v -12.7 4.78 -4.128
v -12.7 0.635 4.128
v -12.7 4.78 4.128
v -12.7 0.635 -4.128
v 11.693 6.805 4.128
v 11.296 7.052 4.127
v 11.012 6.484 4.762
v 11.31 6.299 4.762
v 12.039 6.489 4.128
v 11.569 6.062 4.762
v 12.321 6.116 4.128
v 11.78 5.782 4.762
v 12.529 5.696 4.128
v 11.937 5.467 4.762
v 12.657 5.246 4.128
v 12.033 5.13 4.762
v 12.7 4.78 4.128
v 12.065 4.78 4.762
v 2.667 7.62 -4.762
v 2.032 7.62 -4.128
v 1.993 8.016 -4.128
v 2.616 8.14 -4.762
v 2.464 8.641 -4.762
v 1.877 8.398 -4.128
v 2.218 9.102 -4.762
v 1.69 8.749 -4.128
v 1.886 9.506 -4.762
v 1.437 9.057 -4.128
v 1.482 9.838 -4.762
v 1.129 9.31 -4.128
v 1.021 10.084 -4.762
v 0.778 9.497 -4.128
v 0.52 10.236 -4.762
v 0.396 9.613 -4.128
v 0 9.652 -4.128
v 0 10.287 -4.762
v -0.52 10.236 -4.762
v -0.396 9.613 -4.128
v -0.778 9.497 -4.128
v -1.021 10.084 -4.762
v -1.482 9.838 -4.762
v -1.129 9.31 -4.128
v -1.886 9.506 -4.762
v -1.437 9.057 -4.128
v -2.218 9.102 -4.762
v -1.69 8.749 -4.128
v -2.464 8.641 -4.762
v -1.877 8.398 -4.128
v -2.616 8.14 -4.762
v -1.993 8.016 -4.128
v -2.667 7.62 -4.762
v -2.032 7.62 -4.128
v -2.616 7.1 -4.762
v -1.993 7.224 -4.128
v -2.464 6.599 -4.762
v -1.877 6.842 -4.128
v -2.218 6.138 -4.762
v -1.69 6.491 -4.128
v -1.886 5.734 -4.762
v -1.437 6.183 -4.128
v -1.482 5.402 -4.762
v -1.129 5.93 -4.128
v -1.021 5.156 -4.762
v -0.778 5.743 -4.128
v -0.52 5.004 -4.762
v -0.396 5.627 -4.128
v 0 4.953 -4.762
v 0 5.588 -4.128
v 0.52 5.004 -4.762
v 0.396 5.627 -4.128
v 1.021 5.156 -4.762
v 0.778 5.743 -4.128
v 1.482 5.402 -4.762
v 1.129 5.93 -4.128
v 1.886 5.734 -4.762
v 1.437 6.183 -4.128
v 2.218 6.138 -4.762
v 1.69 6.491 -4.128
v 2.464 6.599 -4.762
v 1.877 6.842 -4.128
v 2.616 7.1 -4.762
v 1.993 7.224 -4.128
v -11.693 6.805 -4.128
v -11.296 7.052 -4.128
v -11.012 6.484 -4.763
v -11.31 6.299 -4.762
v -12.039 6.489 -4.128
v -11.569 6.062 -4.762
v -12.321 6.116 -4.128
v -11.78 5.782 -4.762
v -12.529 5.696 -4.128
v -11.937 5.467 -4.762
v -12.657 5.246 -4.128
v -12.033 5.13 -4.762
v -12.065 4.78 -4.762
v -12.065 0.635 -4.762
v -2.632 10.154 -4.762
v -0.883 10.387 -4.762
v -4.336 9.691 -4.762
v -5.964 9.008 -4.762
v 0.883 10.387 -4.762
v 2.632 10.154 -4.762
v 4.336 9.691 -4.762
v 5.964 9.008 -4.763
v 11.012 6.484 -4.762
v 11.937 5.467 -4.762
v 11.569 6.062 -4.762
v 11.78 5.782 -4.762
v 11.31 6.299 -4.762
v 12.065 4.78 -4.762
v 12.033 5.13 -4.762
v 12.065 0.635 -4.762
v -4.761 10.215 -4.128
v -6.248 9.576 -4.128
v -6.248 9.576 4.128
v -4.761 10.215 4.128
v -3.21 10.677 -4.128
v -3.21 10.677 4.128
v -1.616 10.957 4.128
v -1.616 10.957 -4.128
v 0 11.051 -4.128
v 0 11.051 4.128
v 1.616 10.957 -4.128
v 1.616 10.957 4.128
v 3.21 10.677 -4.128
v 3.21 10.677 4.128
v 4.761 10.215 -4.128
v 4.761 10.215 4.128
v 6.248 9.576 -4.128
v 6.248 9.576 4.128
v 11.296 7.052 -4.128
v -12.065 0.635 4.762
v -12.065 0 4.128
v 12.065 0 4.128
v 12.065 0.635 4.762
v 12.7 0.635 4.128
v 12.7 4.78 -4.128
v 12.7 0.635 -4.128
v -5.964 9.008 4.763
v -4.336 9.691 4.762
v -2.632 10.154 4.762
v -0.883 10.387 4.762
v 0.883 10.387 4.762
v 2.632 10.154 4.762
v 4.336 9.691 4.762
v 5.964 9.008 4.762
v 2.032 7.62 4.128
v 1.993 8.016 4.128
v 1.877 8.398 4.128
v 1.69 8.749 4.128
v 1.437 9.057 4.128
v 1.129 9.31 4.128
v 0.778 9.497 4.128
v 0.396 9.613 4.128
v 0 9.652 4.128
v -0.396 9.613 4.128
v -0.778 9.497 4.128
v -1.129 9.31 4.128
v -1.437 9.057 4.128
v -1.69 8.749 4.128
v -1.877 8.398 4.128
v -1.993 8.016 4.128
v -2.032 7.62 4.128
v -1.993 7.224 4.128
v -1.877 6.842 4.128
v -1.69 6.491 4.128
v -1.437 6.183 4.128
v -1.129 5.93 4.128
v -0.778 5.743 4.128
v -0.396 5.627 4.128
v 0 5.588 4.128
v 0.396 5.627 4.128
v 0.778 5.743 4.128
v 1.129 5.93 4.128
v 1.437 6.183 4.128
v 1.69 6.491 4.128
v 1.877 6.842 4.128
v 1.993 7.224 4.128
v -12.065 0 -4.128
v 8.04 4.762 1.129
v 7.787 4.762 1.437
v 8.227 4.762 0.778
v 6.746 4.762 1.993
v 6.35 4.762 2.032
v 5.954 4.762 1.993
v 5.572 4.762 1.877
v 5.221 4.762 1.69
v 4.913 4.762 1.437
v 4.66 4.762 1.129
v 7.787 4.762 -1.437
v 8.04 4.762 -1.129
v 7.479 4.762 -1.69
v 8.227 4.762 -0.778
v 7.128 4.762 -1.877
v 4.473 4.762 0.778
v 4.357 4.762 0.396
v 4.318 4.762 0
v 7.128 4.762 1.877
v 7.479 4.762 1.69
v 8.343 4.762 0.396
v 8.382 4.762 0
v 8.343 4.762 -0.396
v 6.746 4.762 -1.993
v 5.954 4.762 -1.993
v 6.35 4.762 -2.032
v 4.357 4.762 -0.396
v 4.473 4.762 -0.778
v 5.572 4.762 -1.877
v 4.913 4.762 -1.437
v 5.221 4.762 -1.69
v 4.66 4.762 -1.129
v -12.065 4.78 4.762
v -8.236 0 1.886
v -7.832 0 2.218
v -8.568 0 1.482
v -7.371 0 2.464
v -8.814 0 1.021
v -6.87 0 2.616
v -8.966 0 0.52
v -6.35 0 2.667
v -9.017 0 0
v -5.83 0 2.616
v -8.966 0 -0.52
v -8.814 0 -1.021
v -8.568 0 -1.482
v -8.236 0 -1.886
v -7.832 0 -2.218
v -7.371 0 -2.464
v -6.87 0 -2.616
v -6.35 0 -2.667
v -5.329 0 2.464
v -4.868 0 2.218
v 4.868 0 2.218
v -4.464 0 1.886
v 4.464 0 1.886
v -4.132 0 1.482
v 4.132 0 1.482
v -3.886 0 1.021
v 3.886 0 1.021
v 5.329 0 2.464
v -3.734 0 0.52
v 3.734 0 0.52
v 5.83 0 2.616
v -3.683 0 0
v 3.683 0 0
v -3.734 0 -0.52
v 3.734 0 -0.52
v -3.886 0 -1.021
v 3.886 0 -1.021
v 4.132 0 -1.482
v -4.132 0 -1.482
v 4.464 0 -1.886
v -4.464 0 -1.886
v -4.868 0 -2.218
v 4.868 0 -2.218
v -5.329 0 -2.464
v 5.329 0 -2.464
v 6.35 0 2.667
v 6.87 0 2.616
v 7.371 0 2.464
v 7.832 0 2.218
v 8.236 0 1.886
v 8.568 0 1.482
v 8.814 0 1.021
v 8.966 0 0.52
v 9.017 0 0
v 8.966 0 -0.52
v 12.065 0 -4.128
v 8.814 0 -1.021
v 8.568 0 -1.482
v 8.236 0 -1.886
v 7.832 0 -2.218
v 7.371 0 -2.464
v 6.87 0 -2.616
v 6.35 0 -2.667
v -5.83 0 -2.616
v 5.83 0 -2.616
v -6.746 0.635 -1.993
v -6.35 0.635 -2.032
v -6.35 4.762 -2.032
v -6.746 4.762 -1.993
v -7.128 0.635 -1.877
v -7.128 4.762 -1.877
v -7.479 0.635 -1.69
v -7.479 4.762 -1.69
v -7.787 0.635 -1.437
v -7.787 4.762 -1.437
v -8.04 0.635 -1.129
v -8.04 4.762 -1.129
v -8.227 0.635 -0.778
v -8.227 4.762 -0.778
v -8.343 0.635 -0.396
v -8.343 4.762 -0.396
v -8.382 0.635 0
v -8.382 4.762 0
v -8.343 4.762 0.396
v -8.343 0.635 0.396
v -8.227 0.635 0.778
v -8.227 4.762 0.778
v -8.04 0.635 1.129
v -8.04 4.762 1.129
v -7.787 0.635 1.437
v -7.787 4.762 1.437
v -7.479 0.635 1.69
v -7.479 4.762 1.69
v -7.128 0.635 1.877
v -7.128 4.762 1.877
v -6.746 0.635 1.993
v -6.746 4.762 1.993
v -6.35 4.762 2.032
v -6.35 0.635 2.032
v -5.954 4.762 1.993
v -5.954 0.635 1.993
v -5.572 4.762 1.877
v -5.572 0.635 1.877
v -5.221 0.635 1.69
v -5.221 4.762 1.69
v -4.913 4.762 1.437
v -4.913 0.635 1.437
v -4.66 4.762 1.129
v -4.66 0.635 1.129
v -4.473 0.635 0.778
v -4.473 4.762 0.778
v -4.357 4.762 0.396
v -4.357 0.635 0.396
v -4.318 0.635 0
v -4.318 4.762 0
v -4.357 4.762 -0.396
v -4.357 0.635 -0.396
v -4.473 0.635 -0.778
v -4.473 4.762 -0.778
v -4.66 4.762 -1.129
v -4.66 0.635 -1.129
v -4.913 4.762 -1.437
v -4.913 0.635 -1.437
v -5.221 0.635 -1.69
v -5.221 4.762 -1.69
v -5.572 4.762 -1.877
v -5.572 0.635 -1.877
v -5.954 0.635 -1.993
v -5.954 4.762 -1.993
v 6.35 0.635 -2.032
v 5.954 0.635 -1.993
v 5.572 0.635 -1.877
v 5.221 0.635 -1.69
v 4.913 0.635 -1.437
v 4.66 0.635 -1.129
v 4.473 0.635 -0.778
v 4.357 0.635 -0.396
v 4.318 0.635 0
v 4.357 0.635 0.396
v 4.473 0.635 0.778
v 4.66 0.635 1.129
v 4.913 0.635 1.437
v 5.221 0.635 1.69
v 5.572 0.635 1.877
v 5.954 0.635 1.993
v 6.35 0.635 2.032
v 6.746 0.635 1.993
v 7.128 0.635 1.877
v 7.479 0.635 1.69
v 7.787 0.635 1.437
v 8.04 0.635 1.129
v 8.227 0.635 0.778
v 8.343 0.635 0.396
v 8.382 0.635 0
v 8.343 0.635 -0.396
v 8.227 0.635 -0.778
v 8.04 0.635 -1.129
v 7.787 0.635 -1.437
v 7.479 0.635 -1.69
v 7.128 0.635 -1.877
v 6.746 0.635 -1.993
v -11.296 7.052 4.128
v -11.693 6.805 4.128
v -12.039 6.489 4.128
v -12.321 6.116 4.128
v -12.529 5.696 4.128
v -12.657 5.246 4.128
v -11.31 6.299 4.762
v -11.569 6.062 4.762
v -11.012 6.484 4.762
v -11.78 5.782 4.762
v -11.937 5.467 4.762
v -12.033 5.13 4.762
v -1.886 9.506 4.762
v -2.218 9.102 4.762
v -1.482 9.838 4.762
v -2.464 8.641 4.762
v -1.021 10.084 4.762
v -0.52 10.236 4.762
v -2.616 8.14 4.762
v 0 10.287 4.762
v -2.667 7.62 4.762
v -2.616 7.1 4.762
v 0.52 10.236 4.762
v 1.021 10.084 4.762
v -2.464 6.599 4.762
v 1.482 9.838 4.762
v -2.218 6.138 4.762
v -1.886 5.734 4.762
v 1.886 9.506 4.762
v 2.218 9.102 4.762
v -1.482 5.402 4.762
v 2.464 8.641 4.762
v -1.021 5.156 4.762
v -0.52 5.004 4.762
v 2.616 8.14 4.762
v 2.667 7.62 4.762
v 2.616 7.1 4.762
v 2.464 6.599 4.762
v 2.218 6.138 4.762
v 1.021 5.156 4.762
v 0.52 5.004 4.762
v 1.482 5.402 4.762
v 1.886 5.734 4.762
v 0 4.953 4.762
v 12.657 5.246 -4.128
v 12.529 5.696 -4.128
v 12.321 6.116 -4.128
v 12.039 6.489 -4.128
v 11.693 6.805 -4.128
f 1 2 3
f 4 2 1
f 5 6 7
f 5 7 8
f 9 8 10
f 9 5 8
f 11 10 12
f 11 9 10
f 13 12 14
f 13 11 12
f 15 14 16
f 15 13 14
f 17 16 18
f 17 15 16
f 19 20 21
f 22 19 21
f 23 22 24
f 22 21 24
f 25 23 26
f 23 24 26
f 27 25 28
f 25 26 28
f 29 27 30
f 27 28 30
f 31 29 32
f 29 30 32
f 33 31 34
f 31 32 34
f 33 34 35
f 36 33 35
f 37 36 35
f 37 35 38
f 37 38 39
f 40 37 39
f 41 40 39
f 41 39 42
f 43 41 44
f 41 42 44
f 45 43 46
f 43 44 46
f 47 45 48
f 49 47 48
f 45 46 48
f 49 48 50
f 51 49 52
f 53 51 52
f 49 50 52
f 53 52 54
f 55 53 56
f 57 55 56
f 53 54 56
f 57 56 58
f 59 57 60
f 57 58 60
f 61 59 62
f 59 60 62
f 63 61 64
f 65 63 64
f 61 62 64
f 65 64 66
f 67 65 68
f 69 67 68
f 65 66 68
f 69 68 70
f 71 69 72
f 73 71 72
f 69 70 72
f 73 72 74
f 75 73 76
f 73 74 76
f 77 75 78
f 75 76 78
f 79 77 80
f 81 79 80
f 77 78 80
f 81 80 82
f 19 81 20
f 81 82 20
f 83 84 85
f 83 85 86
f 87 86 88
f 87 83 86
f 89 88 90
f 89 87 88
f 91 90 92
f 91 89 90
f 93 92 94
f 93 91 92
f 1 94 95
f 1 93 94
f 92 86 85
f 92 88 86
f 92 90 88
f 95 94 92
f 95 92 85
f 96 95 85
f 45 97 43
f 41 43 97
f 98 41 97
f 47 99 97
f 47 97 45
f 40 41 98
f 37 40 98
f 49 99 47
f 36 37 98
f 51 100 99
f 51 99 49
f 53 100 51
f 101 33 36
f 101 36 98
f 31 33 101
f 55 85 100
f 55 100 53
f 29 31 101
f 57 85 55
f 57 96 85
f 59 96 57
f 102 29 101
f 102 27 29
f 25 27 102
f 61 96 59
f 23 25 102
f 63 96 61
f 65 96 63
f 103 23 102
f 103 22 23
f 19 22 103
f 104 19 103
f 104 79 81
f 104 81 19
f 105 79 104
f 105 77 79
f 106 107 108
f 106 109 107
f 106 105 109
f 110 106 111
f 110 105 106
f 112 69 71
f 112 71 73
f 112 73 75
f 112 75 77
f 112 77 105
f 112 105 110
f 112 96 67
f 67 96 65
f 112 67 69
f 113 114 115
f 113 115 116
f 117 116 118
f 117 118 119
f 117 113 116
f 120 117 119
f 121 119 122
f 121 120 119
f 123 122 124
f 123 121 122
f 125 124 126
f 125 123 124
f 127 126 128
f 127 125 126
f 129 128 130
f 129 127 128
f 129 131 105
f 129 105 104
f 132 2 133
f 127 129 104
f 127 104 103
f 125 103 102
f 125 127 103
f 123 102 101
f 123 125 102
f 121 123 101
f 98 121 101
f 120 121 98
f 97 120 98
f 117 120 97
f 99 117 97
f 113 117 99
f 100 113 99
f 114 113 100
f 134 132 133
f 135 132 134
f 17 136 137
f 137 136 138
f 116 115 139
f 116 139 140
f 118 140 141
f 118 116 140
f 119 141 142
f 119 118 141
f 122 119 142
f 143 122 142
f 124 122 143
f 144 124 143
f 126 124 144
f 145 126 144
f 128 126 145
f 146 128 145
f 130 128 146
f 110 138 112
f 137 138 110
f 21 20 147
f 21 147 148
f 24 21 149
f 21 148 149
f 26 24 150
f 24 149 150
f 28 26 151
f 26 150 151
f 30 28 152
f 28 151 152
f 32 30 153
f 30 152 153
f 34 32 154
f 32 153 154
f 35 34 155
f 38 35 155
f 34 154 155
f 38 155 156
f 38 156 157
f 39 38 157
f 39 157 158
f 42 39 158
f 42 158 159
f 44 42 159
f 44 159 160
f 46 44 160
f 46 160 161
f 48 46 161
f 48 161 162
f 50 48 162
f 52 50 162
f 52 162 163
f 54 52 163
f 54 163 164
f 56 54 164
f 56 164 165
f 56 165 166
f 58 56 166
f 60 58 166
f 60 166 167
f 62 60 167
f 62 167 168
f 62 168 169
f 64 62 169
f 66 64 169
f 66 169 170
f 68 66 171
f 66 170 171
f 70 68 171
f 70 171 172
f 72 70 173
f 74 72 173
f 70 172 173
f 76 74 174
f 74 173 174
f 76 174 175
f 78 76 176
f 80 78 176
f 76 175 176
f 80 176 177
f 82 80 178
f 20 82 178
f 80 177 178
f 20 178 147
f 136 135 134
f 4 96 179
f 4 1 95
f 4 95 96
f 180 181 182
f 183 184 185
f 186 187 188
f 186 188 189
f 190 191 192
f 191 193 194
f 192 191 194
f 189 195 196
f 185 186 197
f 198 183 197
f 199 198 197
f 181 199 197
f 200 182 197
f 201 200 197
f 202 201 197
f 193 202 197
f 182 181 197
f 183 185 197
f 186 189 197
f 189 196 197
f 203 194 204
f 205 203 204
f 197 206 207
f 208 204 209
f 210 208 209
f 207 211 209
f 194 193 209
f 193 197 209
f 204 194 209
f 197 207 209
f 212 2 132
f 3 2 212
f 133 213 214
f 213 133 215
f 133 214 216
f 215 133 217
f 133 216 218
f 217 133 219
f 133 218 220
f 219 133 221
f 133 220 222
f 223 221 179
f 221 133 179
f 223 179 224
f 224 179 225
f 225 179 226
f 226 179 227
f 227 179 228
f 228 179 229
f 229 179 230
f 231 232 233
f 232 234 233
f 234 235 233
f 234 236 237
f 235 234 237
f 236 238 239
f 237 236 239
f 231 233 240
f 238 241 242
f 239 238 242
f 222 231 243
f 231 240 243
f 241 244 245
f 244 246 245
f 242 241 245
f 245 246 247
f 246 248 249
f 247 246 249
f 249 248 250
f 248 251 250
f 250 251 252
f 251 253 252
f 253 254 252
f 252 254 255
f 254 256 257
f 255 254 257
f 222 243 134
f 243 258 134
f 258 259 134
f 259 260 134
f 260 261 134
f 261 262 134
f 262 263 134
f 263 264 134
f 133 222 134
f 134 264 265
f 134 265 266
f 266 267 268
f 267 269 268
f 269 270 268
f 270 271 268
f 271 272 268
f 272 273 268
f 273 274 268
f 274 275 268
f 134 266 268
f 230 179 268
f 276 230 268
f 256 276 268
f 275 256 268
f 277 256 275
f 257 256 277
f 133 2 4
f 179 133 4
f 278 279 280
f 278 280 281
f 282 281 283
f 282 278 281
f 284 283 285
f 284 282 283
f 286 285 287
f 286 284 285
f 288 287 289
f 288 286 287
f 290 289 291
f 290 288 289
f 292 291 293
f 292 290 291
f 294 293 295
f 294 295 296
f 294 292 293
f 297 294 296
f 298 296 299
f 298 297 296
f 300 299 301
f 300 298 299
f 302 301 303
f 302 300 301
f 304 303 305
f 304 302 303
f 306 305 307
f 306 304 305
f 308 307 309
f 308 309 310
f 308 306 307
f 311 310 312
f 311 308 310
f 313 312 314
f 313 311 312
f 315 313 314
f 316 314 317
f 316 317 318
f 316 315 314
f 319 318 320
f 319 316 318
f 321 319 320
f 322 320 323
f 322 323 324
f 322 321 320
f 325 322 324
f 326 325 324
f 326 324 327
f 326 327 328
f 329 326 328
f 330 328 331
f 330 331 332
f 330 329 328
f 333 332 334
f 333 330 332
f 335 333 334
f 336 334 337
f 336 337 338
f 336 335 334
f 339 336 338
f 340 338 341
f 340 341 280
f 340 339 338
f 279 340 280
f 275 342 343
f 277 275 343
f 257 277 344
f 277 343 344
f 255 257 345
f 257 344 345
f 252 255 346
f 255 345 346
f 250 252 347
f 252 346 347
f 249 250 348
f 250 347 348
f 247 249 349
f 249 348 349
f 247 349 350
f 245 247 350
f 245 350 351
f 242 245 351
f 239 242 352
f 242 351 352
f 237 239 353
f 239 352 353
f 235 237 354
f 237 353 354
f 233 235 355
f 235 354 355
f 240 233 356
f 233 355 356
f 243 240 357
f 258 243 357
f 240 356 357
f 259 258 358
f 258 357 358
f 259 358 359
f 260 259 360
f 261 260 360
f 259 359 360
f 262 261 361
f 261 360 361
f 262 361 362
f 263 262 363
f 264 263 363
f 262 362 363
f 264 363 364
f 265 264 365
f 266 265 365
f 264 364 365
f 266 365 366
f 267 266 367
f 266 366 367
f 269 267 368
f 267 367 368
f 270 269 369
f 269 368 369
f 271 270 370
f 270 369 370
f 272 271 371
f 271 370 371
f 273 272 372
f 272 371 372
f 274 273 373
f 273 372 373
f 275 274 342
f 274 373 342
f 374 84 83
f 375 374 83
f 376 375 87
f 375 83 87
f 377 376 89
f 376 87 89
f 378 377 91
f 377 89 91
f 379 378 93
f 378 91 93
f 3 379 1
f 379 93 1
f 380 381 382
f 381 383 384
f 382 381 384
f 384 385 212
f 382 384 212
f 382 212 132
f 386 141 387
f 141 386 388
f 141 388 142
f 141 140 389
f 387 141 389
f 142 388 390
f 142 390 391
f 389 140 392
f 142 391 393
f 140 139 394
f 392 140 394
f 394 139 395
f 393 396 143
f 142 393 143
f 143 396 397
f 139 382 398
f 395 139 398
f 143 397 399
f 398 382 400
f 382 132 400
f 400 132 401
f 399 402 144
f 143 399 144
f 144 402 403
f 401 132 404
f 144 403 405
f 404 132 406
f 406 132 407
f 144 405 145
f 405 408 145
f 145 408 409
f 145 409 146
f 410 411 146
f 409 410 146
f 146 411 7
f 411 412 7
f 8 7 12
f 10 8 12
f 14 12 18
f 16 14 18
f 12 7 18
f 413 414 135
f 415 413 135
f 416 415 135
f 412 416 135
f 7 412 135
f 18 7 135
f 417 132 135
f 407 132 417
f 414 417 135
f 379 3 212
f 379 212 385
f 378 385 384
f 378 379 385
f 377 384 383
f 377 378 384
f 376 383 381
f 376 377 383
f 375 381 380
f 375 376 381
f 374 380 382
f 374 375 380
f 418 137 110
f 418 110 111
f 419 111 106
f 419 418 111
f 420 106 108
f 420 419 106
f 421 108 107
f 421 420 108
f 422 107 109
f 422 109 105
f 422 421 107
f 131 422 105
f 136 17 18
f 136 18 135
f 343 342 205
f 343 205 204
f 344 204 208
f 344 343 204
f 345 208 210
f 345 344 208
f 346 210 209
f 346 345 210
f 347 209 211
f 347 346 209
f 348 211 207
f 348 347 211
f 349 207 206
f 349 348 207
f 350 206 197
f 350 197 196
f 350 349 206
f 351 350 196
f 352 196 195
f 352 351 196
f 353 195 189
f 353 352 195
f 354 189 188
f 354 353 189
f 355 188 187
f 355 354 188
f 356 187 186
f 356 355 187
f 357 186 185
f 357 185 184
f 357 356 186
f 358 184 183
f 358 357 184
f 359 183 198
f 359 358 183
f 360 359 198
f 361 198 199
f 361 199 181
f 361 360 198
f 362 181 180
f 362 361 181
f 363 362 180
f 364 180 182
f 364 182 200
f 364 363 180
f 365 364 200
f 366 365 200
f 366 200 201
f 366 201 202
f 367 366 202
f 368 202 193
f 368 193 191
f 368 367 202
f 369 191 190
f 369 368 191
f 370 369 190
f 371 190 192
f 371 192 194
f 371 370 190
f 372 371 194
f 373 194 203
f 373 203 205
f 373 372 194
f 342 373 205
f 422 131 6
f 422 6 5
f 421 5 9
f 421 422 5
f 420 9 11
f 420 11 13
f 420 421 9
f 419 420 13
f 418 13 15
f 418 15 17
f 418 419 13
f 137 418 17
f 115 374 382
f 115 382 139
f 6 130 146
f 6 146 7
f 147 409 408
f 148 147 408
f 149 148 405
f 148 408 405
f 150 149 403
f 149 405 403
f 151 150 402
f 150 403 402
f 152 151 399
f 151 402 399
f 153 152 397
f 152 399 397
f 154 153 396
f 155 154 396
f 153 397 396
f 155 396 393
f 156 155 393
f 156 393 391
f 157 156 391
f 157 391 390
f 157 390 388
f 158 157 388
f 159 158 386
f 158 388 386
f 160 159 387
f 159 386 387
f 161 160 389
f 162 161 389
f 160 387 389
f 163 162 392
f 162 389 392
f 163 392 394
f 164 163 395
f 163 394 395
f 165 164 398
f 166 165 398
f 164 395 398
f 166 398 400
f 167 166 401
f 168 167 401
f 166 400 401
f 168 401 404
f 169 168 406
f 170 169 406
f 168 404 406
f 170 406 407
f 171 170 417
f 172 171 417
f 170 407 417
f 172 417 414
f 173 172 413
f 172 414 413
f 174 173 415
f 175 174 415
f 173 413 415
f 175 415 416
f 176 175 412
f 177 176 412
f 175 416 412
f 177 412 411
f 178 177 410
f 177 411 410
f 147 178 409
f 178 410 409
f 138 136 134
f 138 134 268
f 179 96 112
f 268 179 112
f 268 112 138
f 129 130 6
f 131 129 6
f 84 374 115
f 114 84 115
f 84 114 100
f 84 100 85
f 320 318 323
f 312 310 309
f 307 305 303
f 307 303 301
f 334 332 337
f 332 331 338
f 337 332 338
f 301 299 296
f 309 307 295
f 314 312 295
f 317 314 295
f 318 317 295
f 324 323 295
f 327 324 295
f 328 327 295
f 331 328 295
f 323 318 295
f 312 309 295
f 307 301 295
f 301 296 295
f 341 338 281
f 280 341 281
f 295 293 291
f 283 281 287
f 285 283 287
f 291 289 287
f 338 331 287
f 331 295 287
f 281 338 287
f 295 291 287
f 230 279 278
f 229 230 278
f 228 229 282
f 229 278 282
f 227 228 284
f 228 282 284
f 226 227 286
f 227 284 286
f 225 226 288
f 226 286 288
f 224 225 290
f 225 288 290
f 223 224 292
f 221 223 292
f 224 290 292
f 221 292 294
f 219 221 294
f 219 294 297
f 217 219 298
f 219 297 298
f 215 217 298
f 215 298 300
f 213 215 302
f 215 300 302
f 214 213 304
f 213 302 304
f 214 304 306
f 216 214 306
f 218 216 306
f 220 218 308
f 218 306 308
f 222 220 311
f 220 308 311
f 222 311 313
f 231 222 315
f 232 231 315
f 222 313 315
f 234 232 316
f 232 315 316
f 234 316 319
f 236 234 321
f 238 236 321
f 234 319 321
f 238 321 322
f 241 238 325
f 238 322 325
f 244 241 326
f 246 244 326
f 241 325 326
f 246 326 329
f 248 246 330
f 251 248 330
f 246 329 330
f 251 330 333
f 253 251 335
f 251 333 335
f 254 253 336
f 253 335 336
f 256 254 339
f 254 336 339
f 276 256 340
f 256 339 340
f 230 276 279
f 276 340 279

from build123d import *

# Parameters (mm, degrees)
SKETCH1_W           = 25.4
SKETCH1_H           = 9.525
BOSS_EXTRUDE1_DEPTH = 12.7
SKETCH1_3_R         = 2.032
CUT_EXTRUDE1_DEPTH  = 4.7625
SKETCH3_R           = 2.032
CUT_EXTRUDE2_DEPTH  = 21.329919454
FILLET1_R           = 13.97
FILLET2_R           = 2.54
CHAMFER1_SIZE       = 0.635
CHAMFER2_SIZE       = 0.635
CHAMFER3_SIZE       = 0.635


with BuildPart() as part:
    # Sketch1 → Boss-Extrude1 (new body)
    with BuildSketch(Plane(origin=(0, 0, 0), x_dir=(1, 0, 0), z_dir=(0, 1, 0))):
        Rectangle(SKETCH1_W, SKETCH1_H)
    extrude(amount=BOSS_EXTRUDE1_DEPTH)

    # Sketch1<3> → Cut-Extrude1 (cut)
    with BuildSketch(Plane(origin=(0, 0, 0), x_dir=(1, 0, 0), z_dir=(0, 1, 0))):
        with Locations(Location((-6.35, 0, 0), (0, 0, 90))):
            Circle(SKETCH1_3_R)
        with Locations(Location((6.35, 0, 0), (0, 0, 90))):
            Circle(SKETCH1_3_R)
    extrude(amount=CUT_EXTRUDE1_DEPTH, mode=Mode.SUBTRACT)

    # Sketch3 → Cut-Extrude2 (cut, through all)
    with BuildSketch(Plane.XY.offset(4.7625)):
        Polygon((-12.7, 12.7), (-12.7, 6.35), (0, 12.7), align=None)
        Polygon((12.7, 12.7), (0, 12.7), (12.7, 6.35), align=None)
        with Locations((0, 7.62)):
            Circle(SKETCH3_R)
    extrude(amount=-CUT_EXTRUDE2_DEPTH, mode=Mode.SUBTRACT)

    # Fillet1
    fillet1_edges = [part.edges().sort_by_distance(p)[0] for p in [
        (0, 12.7, 0),
    ]]
    fillet(fillet1_edges, radius=FILLET1_R)

    # Fillet2
    fillet2_edges = [part.edges().sort_by_distance(p)[0] for p in [
        (-12.7, 6.35, 0),
        (12.7, 6.35, 0),
    ]]
    fillet(fillet2_edges, radius=FILLET2_R)

    # Chamfer1
    chamfer1_edges = [part.edges().sort_by_distance(p)[0] for p in [
        (-2.032, 7.62, -4.7625),
        (-2.032, 7.62, 4.7625),
    ]]
    chamfer(chamfer1_edges, length=CHAMFER1_SIZE)

    # Chamfer2
    chamfer2_edges = [part.edges().sort_by_distance(p)[0] for p in [
        (-6.35, 0, 2.032),
        (6.35, 0, 2.032),
    ]]
    chamfer(chamfer2_edges, length=CHAMFER2_SIZE)

    # Chamfer3
    chamfer3_edges = [part.edges().sort_by_distance(p)[0] for p in [
        (8.771748231, 8.314125885, 4.7625),
        (8.771748231, 8.314125885, -4.7625),
        (0, 0, -4.7625),
        (0, 11.051065177, 4.7625),
        (0, 11.051065177, -4.7625),
        (-12.7, 0, 0),
        (12.7, 2.390096834, -4.7625),
        (12.7, 2.390096834, 4.7625),
        (-8.771748231, 8.314125885, 4.7625),
        (-12.7, 2.390096834, 4.7625),
        (-12.320653053, 6.115550693, 4.7625),
        (0, 0, 4.7625),
        (12.320653053, 6.115550693, 4.7625),
        (-8.771748231, 8.314125885, -4.7625),
        (-12.7, 2.390096834, -4.7625),
        (-12.320653053, 6.115550693, -4.7625),
        (12.320653053, 6.115550693, -4.7625),
        (12.7, 0, 0),
    ]]
    chamfer(chamfer3_edges, length=CHAMFER3_SIZE)


solid = part.part
